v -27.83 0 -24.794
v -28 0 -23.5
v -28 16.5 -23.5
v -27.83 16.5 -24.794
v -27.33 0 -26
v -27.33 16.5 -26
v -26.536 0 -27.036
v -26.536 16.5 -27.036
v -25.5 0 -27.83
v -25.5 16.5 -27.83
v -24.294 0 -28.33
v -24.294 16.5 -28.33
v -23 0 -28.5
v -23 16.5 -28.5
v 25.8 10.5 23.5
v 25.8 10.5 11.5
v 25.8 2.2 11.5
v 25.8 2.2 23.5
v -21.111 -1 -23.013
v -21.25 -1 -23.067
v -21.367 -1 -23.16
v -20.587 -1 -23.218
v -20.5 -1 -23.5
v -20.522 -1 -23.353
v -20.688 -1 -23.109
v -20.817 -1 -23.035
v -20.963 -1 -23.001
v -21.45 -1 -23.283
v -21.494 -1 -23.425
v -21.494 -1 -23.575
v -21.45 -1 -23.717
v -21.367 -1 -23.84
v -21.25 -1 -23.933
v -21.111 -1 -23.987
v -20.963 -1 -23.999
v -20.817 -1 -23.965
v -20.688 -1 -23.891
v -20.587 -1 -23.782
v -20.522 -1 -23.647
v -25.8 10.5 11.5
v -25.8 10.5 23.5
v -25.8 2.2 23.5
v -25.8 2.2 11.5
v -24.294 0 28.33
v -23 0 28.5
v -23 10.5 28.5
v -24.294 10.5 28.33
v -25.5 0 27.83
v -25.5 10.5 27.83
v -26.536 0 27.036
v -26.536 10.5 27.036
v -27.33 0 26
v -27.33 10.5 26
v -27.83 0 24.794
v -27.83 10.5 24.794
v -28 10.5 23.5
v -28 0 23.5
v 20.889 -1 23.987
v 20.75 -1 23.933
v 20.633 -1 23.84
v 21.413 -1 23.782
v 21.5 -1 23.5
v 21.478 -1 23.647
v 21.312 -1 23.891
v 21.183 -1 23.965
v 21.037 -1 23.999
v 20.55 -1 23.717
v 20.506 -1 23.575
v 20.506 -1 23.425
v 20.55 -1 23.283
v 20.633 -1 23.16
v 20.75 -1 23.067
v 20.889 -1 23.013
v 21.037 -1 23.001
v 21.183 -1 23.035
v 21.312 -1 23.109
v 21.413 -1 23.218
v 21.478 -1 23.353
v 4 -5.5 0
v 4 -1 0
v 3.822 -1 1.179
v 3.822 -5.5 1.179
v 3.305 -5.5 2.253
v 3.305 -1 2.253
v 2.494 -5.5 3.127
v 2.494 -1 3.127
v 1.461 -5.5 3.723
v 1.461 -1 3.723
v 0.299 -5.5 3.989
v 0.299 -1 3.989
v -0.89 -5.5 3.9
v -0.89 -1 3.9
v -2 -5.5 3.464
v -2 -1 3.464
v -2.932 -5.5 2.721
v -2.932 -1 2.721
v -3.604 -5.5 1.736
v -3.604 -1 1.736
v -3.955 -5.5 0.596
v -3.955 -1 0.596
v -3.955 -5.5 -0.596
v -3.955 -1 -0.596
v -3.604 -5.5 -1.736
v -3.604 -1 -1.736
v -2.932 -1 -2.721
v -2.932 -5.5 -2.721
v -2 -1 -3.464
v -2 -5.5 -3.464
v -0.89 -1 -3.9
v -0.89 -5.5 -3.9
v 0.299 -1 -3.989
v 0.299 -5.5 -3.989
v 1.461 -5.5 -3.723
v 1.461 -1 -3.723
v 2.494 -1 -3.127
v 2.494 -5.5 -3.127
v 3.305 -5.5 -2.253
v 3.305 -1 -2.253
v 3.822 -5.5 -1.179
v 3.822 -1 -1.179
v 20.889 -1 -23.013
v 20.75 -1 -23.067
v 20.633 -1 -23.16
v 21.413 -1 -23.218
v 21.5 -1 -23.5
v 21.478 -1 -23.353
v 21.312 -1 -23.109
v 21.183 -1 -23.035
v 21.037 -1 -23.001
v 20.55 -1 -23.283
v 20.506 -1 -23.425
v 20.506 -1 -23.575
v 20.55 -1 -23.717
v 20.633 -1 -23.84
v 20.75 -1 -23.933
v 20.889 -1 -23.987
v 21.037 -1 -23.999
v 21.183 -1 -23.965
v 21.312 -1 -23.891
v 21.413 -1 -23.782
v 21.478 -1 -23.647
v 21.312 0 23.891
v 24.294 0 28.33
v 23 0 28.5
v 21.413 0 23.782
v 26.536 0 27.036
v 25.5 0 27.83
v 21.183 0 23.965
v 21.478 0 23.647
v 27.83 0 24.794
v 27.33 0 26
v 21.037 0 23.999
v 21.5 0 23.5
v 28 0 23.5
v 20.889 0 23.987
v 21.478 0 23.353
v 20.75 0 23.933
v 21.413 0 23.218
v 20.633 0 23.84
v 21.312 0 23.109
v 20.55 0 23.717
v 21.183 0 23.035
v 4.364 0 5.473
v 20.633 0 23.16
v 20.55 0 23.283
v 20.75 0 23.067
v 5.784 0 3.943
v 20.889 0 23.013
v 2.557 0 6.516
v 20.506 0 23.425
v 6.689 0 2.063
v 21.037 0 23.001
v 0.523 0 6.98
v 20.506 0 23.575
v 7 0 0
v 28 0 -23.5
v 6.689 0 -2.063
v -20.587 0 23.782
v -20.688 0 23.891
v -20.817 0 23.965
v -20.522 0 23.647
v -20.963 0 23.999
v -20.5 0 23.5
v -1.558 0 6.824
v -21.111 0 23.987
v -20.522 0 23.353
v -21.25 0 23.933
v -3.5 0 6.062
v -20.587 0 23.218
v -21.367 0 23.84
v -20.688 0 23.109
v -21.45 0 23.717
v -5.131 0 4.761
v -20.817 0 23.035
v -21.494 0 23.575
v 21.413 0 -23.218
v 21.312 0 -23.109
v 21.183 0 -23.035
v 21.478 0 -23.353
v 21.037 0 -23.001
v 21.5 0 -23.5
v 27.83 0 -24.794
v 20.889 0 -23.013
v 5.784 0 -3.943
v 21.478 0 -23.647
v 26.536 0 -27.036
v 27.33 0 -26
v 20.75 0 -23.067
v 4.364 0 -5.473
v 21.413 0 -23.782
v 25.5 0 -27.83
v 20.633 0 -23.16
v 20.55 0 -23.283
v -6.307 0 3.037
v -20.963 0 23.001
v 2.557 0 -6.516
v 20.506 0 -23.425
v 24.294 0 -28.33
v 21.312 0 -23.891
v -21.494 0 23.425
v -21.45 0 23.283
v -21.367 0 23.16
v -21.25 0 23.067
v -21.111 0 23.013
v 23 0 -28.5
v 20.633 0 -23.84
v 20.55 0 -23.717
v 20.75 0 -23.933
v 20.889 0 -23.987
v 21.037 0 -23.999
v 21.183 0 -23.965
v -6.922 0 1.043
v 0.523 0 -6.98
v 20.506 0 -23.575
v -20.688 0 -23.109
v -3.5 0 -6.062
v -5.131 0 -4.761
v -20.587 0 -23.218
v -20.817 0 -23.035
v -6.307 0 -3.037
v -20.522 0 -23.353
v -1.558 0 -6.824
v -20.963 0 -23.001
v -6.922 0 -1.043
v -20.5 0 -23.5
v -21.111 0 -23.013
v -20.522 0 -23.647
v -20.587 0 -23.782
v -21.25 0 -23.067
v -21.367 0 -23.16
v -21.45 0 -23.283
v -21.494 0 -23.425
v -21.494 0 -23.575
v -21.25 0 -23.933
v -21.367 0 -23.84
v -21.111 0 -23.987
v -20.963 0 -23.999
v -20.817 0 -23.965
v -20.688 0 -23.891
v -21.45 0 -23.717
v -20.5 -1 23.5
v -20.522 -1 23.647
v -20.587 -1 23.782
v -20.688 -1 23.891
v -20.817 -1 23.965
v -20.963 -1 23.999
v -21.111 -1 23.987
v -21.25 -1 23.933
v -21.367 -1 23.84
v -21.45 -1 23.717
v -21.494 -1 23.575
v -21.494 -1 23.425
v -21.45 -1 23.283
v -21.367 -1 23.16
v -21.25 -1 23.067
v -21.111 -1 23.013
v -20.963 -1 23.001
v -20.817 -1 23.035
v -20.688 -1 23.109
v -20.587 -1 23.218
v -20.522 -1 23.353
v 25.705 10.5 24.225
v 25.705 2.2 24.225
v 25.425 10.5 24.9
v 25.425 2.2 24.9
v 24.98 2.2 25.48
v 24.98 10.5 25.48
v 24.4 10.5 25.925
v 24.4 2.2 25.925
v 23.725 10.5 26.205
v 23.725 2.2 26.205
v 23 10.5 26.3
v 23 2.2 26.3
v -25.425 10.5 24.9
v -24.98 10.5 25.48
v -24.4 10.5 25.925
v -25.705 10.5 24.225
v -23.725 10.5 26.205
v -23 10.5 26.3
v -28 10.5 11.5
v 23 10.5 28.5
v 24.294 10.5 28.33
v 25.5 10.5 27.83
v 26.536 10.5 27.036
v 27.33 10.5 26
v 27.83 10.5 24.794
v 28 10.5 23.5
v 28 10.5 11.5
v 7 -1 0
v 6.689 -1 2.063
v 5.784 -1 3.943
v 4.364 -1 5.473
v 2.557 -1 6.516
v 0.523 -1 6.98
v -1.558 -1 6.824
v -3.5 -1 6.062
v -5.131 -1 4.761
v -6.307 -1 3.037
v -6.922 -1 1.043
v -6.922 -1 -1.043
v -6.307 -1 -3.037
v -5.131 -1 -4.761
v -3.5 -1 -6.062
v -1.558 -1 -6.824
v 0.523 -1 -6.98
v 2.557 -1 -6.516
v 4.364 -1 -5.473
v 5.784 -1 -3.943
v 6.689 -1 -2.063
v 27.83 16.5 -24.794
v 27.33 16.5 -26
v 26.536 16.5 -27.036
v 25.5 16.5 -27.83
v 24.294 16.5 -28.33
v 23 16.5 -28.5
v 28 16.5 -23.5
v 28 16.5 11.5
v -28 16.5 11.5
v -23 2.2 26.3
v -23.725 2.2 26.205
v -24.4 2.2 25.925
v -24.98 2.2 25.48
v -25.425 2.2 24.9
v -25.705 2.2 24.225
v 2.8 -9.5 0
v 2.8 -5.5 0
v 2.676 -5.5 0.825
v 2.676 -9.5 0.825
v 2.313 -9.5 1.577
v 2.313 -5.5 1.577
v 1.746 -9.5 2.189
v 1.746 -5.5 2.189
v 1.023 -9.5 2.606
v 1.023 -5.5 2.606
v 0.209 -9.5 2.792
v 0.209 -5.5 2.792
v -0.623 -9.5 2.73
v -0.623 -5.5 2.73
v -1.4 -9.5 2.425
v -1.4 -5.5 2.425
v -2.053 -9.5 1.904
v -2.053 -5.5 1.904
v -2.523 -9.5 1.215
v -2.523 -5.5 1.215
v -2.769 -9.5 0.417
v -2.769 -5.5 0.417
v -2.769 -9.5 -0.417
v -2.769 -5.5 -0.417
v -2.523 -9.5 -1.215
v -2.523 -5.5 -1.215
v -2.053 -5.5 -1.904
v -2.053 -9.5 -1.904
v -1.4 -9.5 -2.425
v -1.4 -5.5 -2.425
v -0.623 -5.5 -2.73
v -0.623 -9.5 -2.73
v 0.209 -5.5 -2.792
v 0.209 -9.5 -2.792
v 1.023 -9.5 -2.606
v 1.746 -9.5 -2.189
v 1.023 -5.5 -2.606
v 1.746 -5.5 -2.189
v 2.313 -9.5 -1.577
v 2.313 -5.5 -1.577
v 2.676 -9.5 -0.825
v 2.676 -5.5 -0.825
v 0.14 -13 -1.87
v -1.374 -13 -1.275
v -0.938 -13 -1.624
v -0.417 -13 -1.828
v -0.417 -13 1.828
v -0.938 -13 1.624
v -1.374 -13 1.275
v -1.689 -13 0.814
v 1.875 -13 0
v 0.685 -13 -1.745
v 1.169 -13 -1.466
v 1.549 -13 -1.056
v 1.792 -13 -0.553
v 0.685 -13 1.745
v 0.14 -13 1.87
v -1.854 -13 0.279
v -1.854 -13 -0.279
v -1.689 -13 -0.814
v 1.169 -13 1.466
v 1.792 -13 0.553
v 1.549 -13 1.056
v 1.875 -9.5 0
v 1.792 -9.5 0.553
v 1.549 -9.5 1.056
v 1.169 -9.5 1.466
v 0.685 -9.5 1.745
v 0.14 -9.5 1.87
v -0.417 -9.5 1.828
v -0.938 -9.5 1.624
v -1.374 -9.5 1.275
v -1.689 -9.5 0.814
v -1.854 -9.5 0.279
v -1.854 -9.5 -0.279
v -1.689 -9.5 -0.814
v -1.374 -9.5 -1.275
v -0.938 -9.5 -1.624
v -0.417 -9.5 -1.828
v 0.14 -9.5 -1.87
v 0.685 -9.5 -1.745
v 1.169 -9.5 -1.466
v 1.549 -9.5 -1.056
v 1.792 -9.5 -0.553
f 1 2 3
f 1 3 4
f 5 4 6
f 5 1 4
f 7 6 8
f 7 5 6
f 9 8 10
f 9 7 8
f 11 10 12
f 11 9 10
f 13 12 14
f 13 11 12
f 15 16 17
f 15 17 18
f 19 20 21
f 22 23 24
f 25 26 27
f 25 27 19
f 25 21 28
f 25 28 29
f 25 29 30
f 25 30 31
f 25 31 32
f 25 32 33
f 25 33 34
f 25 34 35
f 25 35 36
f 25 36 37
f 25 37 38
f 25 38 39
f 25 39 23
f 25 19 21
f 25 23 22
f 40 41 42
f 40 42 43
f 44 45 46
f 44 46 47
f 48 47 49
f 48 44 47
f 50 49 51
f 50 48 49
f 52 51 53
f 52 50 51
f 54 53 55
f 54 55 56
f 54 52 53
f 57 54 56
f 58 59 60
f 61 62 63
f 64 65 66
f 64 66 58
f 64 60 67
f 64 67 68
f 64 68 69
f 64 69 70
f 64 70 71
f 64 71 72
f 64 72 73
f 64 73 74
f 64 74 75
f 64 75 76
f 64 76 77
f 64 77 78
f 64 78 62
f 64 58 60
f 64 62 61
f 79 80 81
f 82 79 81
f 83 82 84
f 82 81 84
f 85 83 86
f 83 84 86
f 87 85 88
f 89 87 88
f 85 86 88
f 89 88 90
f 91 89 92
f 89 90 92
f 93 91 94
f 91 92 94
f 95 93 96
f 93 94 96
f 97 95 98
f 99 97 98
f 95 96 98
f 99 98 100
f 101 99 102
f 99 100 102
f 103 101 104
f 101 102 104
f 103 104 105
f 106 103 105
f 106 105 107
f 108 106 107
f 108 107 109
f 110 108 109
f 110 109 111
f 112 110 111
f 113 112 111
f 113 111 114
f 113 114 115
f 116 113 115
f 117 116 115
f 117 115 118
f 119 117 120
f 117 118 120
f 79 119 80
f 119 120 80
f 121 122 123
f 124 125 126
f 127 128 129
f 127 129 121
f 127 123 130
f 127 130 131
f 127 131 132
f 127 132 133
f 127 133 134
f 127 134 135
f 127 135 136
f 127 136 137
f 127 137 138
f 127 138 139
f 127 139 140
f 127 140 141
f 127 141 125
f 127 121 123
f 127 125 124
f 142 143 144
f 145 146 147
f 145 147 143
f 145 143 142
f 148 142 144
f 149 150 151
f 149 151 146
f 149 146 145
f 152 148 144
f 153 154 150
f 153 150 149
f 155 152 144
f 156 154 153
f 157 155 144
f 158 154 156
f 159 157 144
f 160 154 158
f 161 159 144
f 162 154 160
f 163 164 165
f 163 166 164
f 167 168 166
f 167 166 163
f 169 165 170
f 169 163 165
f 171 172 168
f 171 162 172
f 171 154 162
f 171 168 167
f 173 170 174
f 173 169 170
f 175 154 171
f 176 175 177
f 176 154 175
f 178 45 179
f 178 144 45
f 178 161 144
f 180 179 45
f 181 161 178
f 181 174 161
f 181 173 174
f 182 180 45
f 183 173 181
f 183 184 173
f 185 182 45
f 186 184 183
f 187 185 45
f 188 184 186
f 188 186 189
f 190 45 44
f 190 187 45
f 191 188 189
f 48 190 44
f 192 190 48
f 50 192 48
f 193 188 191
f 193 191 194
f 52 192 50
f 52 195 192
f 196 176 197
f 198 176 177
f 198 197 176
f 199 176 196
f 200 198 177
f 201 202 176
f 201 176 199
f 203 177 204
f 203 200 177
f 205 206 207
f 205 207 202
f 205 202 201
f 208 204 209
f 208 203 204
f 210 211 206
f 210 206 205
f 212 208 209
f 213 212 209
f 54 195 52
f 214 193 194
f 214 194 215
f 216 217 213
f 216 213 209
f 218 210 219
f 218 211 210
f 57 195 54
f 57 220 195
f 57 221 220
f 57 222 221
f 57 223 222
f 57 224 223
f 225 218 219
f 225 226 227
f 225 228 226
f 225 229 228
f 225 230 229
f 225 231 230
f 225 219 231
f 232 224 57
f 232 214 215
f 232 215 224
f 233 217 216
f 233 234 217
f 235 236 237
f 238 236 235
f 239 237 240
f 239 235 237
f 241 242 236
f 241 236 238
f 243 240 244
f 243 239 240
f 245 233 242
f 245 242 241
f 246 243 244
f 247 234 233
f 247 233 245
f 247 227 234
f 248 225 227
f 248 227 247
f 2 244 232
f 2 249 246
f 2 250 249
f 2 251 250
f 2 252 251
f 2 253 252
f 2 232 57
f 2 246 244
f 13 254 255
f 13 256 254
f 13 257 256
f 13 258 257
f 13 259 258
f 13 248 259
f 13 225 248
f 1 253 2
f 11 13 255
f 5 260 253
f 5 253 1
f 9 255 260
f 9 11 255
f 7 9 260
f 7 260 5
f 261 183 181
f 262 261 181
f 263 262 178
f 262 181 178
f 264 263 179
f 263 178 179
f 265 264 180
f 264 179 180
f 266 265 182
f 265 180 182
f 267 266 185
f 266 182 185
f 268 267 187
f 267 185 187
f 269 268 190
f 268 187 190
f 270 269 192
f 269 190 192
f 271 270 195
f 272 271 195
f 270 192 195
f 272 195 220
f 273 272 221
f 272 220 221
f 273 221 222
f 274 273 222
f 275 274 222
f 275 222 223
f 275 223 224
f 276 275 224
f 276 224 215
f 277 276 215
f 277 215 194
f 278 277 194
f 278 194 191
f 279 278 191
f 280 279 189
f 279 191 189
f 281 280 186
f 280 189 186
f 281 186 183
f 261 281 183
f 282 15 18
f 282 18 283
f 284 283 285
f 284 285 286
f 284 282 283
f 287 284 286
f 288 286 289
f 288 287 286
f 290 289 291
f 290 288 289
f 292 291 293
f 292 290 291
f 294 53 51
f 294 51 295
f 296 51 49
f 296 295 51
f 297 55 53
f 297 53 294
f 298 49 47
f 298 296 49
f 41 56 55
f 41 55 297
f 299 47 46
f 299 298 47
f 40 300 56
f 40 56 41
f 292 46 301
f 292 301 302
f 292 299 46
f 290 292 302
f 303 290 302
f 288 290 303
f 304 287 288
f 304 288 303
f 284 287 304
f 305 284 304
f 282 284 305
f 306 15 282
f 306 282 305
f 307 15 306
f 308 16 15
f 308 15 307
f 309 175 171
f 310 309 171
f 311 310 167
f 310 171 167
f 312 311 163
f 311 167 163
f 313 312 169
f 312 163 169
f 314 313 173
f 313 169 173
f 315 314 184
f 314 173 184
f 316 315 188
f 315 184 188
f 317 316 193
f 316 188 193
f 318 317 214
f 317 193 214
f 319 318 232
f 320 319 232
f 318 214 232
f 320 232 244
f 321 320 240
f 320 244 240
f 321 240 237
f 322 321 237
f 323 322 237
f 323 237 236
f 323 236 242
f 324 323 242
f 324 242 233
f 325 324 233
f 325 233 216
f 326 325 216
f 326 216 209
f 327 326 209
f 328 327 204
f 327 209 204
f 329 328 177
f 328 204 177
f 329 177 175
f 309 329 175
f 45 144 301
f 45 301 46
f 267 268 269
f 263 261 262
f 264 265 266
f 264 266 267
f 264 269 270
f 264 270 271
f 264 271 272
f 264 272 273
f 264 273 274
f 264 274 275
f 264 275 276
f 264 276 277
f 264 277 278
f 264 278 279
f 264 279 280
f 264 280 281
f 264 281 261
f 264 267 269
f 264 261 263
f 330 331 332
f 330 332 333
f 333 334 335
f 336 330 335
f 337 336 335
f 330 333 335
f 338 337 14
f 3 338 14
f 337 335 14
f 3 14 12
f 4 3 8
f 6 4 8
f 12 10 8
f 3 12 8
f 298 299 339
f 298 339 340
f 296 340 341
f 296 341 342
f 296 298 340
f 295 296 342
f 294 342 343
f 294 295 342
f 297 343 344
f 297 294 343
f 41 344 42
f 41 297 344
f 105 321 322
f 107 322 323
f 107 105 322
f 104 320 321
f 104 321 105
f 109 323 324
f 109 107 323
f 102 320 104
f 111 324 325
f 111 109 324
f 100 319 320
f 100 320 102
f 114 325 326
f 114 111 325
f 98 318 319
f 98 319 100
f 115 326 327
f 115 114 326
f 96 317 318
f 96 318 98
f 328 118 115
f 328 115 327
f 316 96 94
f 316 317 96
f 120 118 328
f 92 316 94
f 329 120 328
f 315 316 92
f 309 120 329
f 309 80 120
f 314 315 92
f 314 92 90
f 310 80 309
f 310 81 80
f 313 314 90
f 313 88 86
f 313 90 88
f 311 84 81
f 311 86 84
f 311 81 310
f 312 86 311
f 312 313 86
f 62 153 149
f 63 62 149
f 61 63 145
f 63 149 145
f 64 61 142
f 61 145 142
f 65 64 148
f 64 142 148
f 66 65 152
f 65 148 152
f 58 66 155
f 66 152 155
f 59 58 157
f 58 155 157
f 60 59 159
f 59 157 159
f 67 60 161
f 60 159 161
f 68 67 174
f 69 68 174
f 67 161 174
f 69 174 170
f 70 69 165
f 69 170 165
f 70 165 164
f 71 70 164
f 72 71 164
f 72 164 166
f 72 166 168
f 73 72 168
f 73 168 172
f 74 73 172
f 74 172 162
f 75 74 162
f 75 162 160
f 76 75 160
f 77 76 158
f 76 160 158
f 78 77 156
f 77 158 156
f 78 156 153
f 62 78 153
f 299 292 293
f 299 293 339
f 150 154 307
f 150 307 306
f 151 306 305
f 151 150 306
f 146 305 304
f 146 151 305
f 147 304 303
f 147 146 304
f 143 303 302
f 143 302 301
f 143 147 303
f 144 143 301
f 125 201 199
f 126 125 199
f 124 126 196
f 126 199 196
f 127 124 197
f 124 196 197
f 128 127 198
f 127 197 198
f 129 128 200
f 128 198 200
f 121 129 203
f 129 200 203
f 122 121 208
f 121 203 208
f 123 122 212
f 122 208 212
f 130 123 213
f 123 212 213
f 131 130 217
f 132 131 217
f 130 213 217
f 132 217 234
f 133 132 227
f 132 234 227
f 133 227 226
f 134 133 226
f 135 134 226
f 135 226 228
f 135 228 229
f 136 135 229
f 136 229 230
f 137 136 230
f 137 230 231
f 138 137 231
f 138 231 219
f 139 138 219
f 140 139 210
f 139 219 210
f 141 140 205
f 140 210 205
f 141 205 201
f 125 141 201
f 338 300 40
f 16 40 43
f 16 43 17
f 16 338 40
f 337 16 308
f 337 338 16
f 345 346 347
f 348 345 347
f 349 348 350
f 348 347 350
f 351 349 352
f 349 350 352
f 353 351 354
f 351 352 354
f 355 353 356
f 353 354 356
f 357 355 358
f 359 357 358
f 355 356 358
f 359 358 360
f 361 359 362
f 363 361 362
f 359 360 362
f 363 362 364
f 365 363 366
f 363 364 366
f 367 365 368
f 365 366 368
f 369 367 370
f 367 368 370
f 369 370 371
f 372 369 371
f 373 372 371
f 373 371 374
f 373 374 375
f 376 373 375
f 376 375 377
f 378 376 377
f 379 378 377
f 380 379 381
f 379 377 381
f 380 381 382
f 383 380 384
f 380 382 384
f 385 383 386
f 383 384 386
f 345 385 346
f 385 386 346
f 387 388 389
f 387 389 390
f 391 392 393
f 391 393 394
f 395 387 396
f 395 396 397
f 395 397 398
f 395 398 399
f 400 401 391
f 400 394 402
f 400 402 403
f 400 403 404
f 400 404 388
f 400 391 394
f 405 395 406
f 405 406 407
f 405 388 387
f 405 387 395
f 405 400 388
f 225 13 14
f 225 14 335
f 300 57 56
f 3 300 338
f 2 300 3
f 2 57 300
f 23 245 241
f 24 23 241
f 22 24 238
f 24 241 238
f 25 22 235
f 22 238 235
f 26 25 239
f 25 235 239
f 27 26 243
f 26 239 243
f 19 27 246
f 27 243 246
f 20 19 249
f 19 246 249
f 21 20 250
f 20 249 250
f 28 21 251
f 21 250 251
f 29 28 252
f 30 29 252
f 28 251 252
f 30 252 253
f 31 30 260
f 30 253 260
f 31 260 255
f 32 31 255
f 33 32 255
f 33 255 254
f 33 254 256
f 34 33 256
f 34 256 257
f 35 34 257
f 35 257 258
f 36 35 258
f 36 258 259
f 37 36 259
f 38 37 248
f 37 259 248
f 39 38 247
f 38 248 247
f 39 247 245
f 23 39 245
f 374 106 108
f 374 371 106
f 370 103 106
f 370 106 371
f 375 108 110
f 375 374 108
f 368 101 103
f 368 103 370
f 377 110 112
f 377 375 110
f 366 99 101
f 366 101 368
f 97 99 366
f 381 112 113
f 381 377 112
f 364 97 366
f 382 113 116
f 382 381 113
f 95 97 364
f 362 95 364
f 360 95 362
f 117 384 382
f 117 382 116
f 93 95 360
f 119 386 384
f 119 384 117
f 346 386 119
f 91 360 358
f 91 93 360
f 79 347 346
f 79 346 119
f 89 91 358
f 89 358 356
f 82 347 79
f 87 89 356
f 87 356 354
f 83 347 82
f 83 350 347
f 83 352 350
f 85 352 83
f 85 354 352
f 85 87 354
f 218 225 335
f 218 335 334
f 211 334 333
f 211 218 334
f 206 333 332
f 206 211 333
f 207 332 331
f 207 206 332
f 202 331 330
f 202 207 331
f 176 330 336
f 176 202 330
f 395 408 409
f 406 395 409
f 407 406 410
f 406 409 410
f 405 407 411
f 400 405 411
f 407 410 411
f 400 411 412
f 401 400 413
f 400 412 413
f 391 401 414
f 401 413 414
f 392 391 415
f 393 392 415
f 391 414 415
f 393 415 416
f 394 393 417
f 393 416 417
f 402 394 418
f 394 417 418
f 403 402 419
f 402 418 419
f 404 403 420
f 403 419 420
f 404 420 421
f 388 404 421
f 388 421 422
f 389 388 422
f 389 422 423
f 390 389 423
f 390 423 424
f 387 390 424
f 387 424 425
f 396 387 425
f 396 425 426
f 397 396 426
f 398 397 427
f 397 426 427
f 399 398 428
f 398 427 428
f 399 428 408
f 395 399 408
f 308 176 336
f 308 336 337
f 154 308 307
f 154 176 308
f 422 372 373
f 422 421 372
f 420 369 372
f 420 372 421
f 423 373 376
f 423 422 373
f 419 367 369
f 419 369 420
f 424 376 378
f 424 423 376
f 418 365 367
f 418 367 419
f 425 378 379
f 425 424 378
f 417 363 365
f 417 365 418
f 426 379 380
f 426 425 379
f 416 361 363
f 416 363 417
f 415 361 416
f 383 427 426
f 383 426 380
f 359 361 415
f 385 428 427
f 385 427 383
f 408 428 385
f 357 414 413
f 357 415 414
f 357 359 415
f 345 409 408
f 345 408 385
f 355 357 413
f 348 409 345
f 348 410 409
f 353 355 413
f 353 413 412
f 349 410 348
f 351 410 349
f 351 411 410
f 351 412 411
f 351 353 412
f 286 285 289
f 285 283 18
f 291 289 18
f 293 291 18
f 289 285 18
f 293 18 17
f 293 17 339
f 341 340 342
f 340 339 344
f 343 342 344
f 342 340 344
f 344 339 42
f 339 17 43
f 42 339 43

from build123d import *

# Parameters (mm, degrees)
EXTRUDE_1_DEPTH     = 16.5
SKETCH_2_W          = 56
SKETCH_2_H          = 17
CUT_EXTRUDE_1_DEPTH = 6
CUT_EXTRUDE_2_DEPTH = 8.3
SKETCH_4_R          = 7
SKETCH_4_R_2        = 0.5
EXTRUDE_2_DEPTH     = 1
SKETCH_5_R          = 4
EXTRUDE_3_DEPTH     = 4.5
SKETCH_6_R          = 2.8
EXTRUDE_4_DEPTH     = 4
SKETCH_7_R          = 1.875
EXTRUDE_5_DEPTH     = 3.5


with BuildPart() as part:
    # 草图1 → 凸台-拉伸1 (new body)
    with BuildSketch(Plane(origin=(0, 0, 0), x_dir=(1, 0, 0), z_dir=(0, 1, 0))):
        with BuildLine():
            Line((-23, 28.5), (23, 28.5))
            ThreePointArc((23, 28.5), (26.535533906, 27.035533906), (28, 23.5))
            Line((28, 23.5), (28, -23.5))
            ThreePointArc((28, -23.5), (26.535533906, -27.035533906), (23, -28.5))
            Line((23, -28.5), (-23, -28.5))
            ThreePointArc((-23, -28.5), (-26.535533906, -27.035533906), (-28, -23.5))
            Line((-28, -23.5), (-28, 23.5))
            ThreePointArc((-28, 23.5), (-26.535533906, 27.035533906), (-23, 28.5))
        make_face()
    extrude(amount=EXTRUDE_1_DEPTH)

    # 草图2 → 切除-拉伸1 (cut)
    with BuildSketch(Plane(origin=(0, 16.5, 0), x_dir=(1, 0, 0), z_dir=(0, 1, 0))):
        with Locations((0, -20)):
            Rectangle(SKETCH_2_W, SKETCH_2_H)
    extrude(amount=-CUT_EXTRUDE_1_DEPTH, mode=Mode.SUBTRACT)

    # 草图3 → 切除-拉伸2 (cut)
    with BuildSketch(Plane(origin=(0, 10.5, 0), x_dir=(1, 0, 0), z_dir=(0, 1, 0))):
        with BuildLine():
            Line((-25.8, -11.5), (25.8, -11.5))
            Line((25.8, -11.5), (25.8, -23.5))
            ThreePointArc((25.8, -23.5), (24.979898987, -25.479898987), (23, -26.3))
            Line((23, -26.3), (-23, -26.3))
            ThreePointArc((-23, -26.3), (-24.979898987, -25.479898987), (-25.8, -23.5))
            Line((-25.8, -23.5), (-25.8, -11.5))
        make_face()
    extrude(amount=-CUT_EXTRUDE_2_DEPTH, mode=Mode.SUBTRACT)

    # 草图4 → 凸台-拉伸2 (add)
    with BuildSketch(Plane.XZ):
        Circle(SKETCH_4_R)
        with Locations((-21, 23.5)):
            Circle(SKETCH_4_R_2)
        with Locations((21, 23.5)):
            Circle(SKETCH_4_R_2)
        with Locations((-21, -23.5)):
            Circle(SKETCH_4_R_2)
        with Locations((21, -23.5)):
            Circle(SKETCH_4_R_2)
    extrude(amount=EXTRUDE_2_DEPTH)

    # 草图5 → 凸台-拉伸3 (add)
    with BuildSketch(Plane.XZ.offset(1)):
        Circle(SKETCH_5_R)
    extrude(amount=EXTRUDE_3_DEPTH)

    # 草图6 → 凸台-拉伸4 (add)
    with BuildSketch(Plane.XZ.offset(5.5)):
        Circle(SKETCH_6_R)
    extrude(amount=EXTRUDE_4_DEPTH)

    # 草图7 → 凸台-拉伸5 (add)
    with BuildSketch(Plane.XZ.offset(9.5)):
        Circle(SKETCH_7_R)
    extrude(amount=EXTRUDE_5_DEPTH)


solid = part.part
